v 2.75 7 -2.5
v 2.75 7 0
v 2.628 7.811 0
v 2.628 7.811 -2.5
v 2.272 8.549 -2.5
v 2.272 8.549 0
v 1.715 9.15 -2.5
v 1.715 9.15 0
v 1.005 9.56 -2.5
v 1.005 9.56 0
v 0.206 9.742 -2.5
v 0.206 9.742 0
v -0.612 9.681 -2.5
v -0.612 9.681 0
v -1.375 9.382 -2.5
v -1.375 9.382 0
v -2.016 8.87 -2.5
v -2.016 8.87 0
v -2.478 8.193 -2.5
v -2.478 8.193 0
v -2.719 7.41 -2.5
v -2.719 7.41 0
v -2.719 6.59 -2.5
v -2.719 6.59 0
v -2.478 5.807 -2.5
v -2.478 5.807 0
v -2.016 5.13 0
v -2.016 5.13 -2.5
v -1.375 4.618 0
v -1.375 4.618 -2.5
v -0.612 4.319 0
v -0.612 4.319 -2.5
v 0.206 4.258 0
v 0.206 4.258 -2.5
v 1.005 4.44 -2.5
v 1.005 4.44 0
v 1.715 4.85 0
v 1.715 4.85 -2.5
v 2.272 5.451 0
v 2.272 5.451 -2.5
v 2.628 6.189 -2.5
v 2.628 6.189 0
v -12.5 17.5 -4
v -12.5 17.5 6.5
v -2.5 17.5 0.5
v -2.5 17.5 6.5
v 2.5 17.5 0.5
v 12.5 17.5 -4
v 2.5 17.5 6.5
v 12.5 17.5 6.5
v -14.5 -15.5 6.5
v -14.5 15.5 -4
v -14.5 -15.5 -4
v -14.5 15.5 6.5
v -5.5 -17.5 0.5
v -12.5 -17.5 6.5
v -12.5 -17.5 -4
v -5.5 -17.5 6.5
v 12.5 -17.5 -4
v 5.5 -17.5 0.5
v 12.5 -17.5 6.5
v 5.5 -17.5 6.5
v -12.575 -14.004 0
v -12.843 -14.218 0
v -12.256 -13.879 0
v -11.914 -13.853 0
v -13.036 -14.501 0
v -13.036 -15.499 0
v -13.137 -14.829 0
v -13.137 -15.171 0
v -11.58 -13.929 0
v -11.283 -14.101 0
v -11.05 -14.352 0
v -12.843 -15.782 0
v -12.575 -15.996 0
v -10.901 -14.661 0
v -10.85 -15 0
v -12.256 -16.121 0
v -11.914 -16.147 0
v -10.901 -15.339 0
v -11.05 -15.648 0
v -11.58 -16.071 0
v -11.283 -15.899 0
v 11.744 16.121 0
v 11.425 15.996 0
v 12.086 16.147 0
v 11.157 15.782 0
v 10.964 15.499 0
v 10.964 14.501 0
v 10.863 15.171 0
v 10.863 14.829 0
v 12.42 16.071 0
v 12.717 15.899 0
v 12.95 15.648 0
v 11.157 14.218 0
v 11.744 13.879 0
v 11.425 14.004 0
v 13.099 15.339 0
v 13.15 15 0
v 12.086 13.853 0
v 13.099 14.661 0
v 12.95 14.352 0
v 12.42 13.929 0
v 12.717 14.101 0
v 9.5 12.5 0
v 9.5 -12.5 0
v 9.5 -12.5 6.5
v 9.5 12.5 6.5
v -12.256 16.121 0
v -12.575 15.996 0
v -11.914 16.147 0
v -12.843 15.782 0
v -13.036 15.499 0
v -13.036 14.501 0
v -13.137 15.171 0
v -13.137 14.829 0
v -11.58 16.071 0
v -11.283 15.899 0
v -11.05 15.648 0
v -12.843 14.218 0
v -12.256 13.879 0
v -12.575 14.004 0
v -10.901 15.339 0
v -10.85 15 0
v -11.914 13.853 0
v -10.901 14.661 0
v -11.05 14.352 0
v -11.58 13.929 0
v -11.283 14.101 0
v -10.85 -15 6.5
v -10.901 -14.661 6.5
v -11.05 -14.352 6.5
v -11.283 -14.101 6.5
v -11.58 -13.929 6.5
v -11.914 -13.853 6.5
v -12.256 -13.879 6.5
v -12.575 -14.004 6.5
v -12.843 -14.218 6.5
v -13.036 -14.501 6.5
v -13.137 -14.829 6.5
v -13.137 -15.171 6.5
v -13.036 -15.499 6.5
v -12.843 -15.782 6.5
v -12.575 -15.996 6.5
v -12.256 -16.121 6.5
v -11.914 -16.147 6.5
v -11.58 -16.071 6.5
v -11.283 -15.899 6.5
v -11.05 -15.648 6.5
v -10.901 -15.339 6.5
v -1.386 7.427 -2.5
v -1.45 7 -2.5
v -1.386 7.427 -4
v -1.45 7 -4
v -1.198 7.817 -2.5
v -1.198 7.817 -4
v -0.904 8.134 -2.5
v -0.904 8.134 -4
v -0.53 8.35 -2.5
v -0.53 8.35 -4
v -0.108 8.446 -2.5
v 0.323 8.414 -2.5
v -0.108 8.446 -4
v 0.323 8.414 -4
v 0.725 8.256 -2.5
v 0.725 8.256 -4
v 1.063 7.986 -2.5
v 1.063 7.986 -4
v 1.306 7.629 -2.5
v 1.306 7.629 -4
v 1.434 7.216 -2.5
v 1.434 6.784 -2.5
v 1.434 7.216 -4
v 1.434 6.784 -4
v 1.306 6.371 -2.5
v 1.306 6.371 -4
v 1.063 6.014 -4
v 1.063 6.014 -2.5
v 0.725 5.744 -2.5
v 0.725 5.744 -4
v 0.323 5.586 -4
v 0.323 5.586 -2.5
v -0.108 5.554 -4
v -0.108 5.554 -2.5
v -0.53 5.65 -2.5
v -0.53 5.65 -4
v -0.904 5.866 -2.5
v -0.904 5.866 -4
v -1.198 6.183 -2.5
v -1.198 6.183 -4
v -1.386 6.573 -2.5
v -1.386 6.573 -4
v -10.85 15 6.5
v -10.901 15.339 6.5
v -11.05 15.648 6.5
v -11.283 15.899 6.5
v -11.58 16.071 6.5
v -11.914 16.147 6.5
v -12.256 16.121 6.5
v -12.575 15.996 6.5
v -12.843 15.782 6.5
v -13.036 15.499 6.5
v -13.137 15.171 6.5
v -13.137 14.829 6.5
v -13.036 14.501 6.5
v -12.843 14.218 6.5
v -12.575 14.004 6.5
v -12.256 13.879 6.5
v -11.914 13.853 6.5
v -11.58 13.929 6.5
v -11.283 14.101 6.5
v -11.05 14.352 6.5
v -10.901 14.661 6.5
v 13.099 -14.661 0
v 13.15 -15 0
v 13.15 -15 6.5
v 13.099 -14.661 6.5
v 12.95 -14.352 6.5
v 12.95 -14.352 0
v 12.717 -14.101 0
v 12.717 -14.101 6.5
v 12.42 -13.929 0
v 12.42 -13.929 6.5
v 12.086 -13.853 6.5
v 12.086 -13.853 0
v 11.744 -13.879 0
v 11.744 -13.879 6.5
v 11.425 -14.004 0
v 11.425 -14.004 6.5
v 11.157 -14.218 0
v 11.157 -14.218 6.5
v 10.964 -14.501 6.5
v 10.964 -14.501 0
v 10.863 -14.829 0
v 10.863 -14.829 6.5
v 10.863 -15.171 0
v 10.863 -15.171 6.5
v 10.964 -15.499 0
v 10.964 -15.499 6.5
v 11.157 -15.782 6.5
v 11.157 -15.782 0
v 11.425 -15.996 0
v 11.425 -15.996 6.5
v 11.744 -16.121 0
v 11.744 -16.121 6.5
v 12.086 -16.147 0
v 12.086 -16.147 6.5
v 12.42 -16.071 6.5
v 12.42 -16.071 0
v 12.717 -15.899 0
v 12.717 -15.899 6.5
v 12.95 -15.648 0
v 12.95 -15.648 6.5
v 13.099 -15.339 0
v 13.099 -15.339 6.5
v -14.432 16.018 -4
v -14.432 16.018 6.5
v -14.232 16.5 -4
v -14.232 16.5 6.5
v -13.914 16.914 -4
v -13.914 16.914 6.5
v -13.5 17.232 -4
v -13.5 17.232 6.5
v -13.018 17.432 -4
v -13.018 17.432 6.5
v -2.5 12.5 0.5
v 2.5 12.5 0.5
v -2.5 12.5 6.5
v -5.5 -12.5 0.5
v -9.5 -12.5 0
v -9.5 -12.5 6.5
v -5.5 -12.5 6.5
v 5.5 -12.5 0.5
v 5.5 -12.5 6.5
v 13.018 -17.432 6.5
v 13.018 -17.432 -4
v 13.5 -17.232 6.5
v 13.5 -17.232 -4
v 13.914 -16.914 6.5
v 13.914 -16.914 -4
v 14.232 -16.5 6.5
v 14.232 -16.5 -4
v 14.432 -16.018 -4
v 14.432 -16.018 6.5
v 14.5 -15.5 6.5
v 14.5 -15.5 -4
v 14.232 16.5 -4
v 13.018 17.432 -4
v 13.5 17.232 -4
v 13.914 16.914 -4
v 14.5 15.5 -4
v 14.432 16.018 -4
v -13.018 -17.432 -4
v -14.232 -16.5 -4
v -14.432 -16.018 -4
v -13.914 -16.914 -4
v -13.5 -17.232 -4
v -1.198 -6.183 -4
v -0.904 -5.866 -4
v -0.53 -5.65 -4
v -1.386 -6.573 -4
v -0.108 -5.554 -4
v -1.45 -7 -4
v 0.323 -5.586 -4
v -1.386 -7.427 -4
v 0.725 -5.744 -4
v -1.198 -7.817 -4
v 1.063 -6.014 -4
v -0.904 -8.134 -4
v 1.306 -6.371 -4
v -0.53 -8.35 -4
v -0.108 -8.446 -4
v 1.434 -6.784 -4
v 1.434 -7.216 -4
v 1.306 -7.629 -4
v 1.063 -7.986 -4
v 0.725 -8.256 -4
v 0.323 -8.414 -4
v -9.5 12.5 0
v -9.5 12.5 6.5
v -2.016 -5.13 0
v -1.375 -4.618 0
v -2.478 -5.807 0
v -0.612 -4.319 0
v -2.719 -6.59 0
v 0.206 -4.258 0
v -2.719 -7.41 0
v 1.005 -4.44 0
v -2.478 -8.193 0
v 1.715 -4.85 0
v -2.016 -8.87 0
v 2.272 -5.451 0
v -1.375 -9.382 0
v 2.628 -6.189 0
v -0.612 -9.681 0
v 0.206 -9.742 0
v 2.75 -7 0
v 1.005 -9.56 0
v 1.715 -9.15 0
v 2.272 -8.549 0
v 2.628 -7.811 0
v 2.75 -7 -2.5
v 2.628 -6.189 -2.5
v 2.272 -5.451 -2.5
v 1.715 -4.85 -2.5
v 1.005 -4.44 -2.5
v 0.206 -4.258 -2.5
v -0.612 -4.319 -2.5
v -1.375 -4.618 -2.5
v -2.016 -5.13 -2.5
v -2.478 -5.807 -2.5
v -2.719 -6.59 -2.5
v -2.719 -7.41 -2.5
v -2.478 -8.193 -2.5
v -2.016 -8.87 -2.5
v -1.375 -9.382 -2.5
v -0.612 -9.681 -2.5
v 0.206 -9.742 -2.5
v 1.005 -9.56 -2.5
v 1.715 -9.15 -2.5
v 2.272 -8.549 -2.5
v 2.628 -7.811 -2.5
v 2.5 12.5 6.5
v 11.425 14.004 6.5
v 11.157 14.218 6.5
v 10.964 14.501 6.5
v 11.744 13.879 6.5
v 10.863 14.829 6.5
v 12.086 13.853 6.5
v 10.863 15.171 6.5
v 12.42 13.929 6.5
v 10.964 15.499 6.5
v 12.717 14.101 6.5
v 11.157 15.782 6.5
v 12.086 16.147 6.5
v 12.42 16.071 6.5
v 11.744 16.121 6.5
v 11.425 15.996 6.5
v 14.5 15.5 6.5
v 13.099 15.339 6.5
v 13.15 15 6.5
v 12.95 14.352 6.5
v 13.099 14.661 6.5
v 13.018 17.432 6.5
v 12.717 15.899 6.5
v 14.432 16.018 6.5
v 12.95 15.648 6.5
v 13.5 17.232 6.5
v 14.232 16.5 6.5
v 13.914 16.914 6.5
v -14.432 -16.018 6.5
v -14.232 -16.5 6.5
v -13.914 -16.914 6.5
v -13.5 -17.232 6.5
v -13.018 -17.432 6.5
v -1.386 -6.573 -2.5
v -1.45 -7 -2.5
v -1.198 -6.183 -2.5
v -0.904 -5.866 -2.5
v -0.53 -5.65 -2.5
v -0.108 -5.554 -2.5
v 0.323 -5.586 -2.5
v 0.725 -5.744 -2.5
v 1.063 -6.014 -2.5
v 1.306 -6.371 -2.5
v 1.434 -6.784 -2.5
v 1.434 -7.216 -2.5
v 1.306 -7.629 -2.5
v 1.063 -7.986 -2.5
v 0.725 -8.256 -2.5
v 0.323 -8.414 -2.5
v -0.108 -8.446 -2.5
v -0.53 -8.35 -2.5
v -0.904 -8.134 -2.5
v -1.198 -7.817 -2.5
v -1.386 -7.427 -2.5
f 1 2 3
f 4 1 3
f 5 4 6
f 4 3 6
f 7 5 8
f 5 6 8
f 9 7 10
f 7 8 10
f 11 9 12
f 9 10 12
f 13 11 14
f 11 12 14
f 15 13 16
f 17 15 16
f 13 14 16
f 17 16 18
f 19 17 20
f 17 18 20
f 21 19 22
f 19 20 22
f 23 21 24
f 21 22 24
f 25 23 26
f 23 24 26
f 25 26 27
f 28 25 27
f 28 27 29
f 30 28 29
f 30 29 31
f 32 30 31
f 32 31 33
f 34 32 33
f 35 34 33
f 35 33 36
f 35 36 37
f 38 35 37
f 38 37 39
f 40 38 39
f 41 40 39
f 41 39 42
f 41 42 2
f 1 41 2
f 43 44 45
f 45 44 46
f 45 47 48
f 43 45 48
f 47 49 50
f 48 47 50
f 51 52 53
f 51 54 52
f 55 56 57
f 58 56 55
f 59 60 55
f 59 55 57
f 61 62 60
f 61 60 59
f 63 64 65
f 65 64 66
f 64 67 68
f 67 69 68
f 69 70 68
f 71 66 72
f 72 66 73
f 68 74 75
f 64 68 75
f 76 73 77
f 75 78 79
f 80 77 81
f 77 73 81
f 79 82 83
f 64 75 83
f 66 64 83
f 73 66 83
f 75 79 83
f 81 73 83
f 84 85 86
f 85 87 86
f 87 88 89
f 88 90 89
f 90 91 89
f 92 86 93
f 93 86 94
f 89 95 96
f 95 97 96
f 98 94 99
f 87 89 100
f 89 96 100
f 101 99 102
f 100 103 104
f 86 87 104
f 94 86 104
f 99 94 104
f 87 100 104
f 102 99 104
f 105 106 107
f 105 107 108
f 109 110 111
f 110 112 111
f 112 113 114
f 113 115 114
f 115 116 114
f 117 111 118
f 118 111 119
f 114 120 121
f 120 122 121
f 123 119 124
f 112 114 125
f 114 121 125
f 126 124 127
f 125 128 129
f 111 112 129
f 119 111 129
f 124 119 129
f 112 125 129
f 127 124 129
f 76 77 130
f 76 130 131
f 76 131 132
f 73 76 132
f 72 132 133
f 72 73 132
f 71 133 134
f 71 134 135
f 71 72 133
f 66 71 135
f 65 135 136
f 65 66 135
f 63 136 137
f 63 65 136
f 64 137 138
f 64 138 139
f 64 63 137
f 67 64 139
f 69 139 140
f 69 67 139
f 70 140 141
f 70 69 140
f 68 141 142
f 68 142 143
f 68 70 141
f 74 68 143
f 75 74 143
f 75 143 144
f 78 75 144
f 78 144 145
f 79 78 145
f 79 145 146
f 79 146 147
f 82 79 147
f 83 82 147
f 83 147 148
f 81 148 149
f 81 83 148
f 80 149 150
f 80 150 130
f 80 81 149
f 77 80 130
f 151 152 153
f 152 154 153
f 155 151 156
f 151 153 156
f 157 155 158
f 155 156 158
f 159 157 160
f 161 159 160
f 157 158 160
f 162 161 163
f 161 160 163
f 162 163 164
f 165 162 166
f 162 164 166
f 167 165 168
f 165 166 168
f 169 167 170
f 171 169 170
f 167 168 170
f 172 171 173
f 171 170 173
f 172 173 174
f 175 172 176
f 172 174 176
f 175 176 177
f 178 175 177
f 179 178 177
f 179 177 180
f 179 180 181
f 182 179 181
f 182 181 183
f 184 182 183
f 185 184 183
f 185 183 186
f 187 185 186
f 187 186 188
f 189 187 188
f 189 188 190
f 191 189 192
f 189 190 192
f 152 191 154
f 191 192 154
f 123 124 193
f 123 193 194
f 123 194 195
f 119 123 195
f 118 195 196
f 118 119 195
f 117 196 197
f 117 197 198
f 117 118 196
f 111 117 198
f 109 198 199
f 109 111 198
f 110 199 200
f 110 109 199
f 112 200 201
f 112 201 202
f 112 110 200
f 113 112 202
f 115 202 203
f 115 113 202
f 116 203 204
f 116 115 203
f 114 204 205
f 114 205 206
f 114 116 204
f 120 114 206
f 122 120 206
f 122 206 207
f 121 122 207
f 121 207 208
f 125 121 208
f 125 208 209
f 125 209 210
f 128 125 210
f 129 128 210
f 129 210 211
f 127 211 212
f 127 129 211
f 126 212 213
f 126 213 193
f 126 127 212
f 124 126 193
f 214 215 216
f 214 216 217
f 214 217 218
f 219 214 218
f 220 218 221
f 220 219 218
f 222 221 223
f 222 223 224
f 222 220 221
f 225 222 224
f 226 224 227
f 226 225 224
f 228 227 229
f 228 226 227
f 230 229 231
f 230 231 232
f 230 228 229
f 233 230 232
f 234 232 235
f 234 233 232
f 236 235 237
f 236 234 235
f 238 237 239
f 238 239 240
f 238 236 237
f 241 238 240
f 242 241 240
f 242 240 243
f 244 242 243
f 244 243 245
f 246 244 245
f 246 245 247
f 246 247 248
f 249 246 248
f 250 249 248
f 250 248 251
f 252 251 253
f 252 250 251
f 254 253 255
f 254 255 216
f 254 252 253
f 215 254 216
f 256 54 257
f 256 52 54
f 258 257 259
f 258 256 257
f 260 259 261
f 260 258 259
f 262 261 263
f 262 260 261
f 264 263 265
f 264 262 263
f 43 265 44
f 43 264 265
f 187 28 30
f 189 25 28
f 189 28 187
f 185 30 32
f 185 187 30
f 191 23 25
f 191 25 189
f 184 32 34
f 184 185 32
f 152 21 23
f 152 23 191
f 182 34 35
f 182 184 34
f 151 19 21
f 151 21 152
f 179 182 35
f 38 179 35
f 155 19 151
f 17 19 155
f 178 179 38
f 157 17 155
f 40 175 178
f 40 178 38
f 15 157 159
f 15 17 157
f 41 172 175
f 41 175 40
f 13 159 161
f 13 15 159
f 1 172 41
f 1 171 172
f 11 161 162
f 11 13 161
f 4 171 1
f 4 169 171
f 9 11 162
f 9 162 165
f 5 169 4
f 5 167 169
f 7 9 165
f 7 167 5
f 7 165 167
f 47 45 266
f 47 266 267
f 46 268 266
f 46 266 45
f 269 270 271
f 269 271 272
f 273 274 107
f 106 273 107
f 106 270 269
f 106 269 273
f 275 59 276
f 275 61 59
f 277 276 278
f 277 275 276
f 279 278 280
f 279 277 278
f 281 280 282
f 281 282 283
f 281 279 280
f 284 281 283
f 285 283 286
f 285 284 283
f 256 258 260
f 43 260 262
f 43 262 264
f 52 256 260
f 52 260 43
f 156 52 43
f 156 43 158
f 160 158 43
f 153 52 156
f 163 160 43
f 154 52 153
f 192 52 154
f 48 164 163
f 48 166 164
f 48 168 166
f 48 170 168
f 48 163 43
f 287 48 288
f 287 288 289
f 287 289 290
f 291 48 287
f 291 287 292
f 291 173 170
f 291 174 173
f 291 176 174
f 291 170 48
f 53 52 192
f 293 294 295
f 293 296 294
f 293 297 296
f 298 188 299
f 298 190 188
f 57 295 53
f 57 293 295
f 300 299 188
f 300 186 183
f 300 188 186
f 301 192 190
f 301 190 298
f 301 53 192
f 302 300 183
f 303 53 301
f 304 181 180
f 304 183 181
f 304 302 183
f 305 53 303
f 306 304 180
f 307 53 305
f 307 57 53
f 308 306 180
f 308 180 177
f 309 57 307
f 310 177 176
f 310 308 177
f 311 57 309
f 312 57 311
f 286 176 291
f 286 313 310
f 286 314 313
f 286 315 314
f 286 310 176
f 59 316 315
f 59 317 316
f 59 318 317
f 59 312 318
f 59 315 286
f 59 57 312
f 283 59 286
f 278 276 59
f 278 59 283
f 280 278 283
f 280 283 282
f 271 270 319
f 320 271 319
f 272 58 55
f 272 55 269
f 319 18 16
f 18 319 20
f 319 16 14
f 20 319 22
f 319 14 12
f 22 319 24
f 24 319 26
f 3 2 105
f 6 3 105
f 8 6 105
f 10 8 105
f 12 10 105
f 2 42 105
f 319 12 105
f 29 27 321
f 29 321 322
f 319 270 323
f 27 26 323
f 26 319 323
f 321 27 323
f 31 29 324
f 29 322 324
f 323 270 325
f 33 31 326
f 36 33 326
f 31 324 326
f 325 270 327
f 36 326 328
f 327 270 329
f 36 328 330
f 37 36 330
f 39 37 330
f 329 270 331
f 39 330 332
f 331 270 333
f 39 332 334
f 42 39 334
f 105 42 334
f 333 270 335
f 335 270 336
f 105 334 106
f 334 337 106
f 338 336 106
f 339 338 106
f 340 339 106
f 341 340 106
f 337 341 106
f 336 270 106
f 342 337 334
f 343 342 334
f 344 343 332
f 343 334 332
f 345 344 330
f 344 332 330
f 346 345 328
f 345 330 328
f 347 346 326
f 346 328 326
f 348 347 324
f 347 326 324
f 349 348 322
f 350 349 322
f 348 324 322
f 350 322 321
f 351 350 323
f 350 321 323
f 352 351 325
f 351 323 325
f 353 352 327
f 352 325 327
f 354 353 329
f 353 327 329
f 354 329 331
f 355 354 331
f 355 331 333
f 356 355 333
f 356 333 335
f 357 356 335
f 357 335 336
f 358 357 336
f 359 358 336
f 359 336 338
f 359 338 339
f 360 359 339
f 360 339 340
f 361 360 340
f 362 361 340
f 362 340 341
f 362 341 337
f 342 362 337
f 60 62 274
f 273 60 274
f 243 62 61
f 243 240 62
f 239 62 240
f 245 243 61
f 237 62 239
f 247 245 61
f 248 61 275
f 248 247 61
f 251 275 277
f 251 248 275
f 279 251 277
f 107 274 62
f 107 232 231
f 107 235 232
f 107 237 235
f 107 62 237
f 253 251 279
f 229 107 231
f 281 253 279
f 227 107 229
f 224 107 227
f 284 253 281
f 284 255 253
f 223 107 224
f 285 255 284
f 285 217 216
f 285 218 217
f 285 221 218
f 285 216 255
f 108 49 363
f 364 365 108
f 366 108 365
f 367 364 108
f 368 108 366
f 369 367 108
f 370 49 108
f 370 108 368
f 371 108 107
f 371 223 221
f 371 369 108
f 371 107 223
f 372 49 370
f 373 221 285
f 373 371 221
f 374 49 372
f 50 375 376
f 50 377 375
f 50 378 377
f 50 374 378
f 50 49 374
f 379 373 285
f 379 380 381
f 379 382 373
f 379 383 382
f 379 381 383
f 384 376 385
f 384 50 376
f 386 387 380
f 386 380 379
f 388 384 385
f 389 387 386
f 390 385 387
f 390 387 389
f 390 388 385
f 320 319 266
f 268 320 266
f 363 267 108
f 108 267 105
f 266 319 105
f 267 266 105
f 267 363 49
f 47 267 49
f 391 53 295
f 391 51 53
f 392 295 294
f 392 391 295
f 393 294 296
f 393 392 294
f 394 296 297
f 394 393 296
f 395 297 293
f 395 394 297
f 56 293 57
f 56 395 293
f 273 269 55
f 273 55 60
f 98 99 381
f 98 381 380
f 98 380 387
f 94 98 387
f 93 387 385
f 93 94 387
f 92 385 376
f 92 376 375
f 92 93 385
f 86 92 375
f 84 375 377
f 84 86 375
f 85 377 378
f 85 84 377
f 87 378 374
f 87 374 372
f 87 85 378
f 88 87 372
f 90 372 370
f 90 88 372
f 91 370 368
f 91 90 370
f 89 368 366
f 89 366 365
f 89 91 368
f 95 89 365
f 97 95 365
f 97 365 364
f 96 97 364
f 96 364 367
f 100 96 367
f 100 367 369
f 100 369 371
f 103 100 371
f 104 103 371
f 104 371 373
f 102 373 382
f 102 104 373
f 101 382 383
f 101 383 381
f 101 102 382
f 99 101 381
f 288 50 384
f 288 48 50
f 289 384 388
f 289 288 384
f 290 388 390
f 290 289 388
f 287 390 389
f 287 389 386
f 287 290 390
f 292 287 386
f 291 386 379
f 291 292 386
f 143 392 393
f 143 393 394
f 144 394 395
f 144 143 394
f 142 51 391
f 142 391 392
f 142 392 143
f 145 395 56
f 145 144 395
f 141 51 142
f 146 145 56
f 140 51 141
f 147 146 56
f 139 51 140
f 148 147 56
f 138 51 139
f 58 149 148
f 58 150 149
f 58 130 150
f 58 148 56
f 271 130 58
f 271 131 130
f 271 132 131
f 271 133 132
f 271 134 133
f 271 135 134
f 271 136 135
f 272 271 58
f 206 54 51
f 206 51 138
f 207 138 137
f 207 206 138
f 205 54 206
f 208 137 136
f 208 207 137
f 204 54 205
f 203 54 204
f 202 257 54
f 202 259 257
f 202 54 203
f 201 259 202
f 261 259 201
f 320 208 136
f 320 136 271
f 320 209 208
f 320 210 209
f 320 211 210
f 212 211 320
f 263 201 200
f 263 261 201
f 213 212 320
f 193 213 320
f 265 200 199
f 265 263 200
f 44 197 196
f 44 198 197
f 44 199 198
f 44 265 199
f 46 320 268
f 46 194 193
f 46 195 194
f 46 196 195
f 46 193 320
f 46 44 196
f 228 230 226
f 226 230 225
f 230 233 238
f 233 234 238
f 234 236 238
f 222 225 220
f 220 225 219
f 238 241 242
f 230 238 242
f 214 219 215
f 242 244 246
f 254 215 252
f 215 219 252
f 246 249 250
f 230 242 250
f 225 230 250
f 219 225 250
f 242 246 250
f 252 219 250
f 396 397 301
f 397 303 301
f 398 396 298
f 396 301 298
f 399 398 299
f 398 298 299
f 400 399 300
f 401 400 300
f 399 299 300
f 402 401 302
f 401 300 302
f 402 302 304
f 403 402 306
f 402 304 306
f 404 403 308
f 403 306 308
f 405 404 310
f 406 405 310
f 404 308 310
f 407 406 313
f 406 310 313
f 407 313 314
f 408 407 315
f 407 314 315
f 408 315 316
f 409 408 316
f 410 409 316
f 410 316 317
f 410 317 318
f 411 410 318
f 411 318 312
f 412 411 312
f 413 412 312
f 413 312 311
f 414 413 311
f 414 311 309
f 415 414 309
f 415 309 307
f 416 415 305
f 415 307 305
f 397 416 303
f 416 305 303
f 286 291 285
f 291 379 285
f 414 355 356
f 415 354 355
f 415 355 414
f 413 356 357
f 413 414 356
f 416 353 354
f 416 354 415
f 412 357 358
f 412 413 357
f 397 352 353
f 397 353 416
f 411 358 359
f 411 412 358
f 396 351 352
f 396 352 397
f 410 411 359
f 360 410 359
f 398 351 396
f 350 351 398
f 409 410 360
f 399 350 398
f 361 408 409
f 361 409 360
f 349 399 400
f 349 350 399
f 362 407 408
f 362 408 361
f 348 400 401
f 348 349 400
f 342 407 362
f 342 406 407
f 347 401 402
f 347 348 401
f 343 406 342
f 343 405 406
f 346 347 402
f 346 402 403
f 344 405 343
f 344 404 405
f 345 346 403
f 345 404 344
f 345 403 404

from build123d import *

# Parameters (mm, degrees)
F0_W           = 29
F0_H           = 35
F0_R           = 1.15
F0_W_2         = 19
F0_H_2         = 25
F1_DEPTH       = 6.5
F2_W           = 29
F2_H           = 35
F2_R           = 1.15
F2_W_2         = 19
F2_H_2         = 25
F3_DEPTH       = 4
F4_W           = 11
F4_H           = 5
F4_W_2         = 5
F5_DEPTH       = 6
F6_R           = 2
F8_D           = 2.9
F8_CBORE_D     = 5.5
F8_CBORE_DEPTH = 2.5


with BuildPart() as f1:
    # F0 (on Top) → F1 (new body)
    with BuildSketch(Plane.XY):
        Rectangle(F0_W, F0_H)
        with Locations((-12, -15)):
            Circle(F0_R, mode=Mode.SUBTRACT)
        with Locations((12, -15)):
            Circle(F0_R, mode=Mode.SUBTRACT)
        with Locations((-12, 15)):
            Circle(F0_R, mode=Mode.SUBTRACT)
        Rectangle(F0_W_2, F0_H_2, mode=Mode.SUBTRACT)
        with Locations((12, 15)):
            Circle(F0_R, mode=Mode.SUBTRACT)
    extrude(amount=F1_DEPTH)

    # F2 (on face) → F3 (join)
    with BuildSketch(Plane(origin=(0, 0, 0), x_dir=(1, 0, 0), z_dir=(0, 0, -1))):
        Rectangle(F2_W, F2_H)
        with Locations((-12, -15)):
            Circle(F2_R, mode=Mode.SUBTRACT)
        with Locations((12, -15)):
            Circle(F2_R, mode=Mode.SUBTRACT)
        with Locations((-12, 15)):
            Circle(F2_R, mode=Mode.SUBTRACT)
        Rectangle(F2_W_2, F2_H_2, mode=Mode.SUBTRACT)
        with Locations((12, 15)):
            Circle(F2_R, mode=Mode.SUBTRACT)
        with Locations((-12, 15)):
            Circle(F2_R)
        with Locations((12, 15)):
            Circle(F2_R)
        with Locations((-12, -15)):
            Circle(F2_R)
        Rectangle(F2_W_2, F2_H_2)
        with Locations((12, -15)):
            Circle(F2_R)
    extrude(amount=F3_DEPTH)

    # F4 (on face) → F5 (cut)
    with BuildSketch(Plane.XY.offset(6.5)):
        with Locations((0, -15)):
            Rectangle(F4_W, F4_H)
        with Locations((0, 15)):
            Rectangle(F4_W_2, F4_H)
    extrude(amount=-F5_DEPTH, mode=Mode.SUBTRACT)

    # F6
    f6_edges = [f1.edges().sort_by_distance(p)[0] for p in [
        (-14.5, 17.5, 1.25),
        (14.5, 17.5, 1.25),
        (14.5, -17.5, 1.25),
        (-14.5, -17.5, 1.25),
    ]]
    fillet(f6_edges, radius=F6_R)

    # F8 (through all)
    with Locations(Plane.XY):
        with Locations((0, 7), (0, -7)):
            CounterBoreHole(F8_D / 2, F8_CBORE_D / 2, F8_CBORE_DEPTH)


solid = f1.part
